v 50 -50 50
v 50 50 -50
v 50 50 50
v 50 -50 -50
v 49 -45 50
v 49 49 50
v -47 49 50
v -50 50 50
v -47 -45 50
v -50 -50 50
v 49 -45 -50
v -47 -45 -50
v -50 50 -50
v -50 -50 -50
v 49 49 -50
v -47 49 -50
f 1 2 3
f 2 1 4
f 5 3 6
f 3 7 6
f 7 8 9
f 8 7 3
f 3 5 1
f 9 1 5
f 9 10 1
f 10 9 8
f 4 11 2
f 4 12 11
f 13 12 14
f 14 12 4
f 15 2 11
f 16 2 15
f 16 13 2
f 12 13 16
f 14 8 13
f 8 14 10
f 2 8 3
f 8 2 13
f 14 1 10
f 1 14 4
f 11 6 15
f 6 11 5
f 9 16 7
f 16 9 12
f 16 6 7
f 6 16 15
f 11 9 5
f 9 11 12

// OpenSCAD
difference() {
    cube([100,100,100], center=true);
    
    translate([1,2,0])
        cube([96,94,102], center=true);
}
